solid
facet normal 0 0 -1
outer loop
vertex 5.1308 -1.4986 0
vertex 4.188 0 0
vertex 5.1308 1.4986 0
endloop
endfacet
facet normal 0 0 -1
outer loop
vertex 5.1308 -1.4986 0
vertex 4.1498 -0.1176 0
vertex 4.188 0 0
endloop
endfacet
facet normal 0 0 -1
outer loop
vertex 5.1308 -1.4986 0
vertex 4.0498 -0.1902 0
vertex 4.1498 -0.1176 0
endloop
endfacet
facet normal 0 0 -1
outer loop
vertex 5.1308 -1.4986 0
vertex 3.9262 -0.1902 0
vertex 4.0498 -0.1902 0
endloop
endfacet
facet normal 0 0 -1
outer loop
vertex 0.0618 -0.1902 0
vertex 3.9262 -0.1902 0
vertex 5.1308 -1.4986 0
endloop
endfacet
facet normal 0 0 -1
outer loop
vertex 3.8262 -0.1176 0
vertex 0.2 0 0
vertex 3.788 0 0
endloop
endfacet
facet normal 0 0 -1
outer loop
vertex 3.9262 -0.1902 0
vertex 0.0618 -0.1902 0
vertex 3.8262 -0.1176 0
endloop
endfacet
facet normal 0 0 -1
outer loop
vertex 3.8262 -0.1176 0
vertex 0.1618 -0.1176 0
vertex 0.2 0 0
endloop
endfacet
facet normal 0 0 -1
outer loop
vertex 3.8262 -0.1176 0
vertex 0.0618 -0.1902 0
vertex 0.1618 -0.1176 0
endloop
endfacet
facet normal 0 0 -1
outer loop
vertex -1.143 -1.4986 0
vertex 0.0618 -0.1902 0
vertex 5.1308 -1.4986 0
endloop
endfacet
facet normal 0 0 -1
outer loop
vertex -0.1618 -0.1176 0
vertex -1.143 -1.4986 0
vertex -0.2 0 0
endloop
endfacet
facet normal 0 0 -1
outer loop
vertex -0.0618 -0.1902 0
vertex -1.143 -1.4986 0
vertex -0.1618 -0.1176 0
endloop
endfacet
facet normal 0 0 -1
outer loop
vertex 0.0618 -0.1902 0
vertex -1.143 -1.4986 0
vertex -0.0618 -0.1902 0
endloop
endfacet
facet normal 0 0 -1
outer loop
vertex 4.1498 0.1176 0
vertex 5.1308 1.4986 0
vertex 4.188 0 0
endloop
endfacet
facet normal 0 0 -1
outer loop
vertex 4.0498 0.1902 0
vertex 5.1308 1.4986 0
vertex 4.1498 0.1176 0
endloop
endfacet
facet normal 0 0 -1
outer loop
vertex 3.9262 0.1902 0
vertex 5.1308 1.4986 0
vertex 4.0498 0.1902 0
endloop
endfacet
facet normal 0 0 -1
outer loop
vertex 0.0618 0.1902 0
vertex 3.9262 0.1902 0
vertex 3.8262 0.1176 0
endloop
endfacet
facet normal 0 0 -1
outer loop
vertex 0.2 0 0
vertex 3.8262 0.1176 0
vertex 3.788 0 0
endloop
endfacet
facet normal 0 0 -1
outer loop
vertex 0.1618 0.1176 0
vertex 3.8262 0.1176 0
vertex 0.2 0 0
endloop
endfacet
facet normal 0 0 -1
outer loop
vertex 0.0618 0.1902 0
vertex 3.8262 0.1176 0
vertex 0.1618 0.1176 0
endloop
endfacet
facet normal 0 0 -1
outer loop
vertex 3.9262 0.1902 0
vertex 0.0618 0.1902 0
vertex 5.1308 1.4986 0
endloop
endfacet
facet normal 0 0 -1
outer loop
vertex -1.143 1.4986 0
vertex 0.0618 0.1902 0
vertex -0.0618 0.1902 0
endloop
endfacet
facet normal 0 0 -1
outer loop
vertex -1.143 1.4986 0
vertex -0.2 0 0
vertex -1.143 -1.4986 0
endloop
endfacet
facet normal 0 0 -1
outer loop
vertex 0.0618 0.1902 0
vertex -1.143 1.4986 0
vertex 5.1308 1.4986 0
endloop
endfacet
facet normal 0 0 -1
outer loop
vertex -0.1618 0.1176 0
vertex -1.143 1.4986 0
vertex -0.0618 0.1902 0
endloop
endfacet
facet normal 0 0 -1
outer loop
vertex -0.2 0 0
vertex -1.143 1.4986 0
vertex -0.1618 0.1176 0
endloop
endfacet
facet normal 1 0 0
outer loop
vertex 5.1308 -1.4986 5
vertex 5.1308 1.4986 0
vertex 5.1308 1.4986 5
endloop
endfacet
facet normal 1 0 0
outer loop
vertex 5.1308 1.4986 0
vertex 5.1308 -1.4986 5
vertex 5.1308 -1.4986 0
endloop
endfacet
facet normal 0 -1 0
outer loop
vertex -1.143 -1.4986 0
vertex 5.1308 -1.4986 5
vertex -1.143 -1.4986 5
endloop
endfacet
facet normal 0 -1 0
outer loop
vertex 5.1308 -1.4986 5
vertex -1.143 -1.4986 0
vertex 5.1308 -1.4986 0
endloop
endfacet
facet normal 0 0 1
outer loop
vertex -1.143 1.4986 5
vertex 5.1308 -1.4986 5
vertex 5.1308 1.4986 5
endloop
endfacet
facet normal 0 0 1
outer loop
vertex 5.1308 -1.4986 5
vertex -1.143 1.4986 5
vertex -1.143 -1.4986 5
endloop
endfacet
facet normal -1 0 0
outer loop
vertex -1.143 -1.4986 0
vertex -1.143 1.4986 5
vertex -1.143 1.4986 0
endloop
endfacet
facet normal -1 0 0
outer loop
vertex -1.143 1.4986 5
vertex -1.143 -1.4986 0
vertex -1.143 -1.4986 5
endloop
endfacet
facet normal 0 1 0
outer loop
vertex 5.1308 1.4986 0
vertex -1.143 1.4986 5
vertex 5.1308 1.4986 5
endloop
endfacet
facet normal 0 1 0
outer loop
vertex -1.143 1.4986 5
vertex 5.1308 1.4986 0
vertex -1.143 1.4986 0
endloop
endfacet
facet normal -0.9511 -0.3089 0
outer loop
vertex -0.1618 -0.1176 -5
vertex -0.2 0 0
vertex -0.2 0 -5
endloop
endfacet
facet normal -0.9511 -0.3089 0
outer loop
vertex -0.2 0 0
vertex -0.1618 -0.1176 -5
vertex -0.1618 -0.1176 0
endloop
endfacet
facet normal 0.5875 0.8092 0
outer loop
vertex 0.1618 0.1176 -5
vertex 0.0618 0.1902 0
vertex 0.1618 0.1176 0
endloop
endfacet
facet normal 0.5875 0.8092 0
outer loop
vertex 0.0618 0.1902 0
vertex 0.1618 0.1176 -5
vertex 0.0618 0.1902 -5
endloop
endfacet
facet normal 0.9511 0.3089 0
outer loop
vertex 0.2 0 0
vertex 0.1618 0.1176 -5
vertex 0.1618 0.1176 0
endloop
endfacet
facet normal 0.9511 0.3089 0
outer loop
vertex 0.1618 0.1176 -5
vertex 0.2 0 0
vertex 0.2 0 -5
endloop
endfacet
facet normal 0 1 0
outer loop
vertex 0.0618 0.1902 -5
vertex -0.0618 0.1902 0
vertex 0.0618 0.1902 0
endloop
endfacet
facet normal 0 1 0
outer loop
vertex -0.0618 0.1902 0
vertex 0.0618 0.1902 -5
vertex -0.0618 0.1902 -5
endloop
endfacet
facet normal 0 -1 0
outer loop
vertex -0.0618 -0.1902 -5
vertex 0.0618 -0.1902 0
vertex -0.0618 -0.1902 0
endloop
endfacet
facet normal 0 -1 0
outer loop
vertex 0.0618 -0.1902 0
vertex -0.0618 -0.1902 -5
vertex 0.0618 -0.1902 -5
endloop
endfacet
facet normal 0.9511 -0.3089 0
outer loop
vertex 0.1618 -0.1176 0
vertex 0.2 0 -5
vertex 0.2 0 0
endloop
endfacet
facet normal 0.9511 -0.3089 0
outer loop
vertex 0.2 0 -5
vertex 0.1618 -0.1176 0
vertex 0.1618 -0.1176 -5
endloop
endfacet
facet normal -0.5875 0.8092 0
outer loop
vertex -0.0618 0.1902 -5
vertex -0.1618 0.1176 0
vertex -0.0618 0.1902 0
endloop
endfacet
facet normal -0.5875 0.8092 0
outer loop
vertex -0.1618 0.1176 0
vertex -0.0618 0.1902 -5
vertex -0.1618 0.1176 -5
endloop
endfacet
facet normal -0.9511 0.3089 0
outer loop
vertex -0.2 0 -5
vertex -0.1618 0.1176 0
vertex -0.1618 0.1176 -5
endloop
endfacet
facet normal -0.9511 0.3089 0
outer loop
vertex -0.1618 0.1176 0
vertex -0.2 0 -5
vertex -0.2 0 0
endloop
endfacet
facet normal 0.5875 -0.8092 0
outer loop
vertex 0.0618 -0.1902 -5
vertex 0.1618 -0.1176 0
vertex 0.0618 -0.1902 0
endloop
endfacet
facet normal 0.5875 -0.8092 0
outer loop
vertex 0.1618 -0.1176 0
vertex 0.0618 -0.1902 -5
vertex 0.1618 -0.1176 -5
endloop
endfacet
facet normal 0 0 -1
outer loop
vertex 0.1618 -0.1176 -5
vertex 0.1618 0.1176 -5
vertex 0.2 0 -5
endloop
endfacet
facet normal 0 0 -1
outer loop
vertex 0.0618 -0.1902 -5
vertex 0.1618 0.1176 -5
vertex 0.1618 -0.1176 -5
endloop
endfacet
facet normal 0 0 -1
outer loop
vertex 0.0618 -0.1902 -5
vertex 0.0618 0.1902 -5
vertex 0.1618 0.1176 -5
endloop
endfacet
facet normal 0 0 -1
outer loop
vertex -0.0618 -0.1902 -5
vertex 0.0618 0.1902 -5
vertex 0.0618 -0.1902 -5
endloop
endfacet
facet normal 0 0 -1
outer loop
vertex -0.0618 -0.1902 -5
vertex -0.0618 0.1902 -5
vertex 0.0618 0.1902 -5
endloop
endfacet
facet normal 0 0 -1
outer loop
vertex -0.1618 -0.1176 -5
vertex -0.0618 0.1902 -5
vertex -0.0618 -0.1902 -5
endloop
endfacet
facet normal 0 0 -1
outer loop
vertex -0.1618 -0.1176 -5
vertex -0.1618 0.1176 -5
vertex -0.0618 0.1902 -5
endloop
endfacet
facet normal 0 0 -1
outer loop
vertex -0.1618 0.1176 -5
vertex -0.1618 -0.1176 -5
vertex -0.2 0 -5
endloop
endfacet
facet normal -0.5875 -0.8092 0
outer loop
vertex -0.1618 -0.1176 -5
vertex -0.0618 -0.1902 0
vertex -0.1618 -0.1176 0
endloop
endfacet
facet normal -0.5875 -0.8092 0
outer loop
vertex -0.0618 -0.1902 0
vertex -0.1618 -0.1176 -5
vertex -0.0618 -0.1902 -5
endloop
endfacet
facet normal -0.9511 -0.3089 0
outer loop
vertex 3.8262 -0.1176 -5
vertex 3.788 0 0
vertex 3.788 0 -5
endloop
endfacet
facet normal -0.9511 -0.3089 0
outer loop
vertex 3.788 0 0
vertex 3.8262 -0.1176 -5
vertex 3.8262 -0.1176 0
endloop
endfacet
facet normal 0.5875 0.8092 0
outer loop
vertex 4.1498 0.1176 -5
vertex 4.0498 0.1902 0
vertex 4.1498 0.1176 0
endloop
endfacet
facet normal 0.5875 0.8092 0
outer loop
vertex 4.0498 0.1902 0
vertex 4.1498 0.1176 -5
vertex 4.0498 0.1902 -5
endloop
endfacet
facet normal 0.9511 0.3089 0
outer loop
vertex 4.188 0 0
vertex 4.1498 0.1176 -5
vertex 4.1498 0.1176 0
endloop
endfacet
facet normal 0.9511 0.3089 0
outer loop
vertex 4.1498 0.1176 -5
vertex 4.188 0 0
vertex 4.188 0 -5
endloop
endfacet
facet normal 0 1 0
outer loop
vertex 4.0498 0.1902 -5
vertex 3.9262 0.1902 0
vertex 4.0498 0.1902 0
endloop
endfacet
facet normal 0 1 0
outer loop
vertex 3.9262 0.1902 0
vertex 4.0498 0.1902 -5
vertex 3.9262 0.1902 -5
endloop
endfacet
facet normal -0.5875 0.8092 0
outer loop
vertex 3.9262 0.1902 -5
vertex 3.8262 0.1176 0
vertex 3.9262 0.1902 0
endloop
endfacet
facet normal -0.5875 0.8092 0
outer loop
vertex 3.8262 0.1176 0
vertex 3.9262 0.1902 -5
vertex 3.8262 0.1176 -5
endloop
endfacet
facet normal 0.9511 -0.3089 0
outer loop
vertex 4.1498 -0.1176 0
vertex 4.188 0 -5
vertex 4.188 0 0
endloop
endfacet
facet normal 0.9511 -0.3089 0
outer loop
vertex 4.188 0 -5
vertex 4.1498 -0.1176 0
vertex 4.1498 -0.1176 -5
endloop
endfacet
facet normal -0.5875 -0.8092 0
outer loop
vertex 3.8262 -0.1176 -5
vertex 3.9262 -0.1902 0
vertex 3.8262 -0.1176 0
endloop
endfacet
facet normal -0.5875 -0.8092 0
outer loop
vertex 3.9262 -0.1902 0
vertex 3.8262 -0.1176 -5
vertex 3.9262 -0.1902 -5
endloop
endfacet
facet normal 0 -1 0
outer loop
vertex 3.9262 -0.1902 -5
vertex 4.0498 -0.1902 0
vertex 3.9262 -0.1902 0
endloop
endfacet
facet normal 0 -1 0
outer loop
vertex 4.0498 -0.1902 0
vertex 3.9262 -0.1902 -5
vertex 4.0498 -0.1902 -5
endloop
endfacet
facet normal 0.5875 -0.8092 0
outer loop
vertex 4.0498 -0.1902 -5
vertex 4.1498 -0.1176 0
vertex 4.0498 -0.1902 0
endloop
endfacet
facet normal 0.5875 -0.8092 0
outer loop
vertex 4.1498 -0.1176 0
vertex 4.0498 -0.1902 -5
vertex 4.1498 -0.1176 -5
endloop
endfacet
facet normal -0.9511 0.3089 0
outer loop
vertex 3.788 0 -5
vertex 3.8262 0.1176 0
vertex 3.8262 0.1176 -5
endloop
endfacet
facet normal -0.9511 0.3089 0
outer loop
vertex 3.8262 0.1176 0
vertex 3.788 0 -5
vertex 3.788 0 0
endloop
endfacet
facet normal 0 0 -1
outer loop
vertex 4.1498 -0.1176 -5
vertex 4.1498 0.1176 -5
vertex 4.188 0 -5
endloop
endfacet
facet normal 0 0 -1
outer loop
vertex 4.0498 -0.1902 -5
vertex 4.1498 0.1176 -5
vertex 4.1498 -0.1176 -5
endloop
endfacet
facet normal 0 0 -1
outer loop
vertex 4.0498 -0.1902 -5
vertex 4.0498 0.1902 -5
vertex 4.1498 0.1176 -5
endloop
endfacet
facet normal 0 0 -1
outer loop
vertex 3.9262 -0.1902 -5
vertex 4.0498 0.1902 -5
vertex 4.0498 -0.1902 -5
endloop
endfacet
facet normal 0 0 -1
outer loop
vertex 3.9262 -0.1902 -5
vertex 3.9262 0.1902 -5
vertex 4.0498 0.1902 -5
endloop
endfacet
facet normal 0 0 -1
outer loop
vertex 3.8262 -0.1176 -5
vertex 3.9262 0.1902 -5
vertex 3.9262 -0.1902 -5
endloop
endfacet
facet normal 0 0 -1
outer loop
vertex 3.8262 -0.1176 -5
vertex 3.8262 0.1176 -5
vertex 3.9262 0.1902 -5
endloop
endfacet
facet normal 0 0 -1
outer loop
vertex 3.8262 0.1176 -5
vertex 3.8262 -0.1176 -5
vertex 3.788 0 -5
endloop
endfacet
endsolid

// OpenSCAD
module FootprintOutline_CHIP_B () {
    module pin() { translate([0,0,-5]) cylinder(r=0.2, h=5, $fn=10); }
  color("gray")
  linear_extrude(height=5) {
    polygon([
      [-1.143000,1.498600],[5.130800,1.498600],
      [5.130800,-1.498600],
      [-1.143000,-1.498600],
      [-1.143000,1.498600],
    ]);
  }
  translate([0.000,0.000,0]) pin(); 
  translate([3.988,0.000,0]) pin(); 
}

FootprintOutline_CHIP_B();
